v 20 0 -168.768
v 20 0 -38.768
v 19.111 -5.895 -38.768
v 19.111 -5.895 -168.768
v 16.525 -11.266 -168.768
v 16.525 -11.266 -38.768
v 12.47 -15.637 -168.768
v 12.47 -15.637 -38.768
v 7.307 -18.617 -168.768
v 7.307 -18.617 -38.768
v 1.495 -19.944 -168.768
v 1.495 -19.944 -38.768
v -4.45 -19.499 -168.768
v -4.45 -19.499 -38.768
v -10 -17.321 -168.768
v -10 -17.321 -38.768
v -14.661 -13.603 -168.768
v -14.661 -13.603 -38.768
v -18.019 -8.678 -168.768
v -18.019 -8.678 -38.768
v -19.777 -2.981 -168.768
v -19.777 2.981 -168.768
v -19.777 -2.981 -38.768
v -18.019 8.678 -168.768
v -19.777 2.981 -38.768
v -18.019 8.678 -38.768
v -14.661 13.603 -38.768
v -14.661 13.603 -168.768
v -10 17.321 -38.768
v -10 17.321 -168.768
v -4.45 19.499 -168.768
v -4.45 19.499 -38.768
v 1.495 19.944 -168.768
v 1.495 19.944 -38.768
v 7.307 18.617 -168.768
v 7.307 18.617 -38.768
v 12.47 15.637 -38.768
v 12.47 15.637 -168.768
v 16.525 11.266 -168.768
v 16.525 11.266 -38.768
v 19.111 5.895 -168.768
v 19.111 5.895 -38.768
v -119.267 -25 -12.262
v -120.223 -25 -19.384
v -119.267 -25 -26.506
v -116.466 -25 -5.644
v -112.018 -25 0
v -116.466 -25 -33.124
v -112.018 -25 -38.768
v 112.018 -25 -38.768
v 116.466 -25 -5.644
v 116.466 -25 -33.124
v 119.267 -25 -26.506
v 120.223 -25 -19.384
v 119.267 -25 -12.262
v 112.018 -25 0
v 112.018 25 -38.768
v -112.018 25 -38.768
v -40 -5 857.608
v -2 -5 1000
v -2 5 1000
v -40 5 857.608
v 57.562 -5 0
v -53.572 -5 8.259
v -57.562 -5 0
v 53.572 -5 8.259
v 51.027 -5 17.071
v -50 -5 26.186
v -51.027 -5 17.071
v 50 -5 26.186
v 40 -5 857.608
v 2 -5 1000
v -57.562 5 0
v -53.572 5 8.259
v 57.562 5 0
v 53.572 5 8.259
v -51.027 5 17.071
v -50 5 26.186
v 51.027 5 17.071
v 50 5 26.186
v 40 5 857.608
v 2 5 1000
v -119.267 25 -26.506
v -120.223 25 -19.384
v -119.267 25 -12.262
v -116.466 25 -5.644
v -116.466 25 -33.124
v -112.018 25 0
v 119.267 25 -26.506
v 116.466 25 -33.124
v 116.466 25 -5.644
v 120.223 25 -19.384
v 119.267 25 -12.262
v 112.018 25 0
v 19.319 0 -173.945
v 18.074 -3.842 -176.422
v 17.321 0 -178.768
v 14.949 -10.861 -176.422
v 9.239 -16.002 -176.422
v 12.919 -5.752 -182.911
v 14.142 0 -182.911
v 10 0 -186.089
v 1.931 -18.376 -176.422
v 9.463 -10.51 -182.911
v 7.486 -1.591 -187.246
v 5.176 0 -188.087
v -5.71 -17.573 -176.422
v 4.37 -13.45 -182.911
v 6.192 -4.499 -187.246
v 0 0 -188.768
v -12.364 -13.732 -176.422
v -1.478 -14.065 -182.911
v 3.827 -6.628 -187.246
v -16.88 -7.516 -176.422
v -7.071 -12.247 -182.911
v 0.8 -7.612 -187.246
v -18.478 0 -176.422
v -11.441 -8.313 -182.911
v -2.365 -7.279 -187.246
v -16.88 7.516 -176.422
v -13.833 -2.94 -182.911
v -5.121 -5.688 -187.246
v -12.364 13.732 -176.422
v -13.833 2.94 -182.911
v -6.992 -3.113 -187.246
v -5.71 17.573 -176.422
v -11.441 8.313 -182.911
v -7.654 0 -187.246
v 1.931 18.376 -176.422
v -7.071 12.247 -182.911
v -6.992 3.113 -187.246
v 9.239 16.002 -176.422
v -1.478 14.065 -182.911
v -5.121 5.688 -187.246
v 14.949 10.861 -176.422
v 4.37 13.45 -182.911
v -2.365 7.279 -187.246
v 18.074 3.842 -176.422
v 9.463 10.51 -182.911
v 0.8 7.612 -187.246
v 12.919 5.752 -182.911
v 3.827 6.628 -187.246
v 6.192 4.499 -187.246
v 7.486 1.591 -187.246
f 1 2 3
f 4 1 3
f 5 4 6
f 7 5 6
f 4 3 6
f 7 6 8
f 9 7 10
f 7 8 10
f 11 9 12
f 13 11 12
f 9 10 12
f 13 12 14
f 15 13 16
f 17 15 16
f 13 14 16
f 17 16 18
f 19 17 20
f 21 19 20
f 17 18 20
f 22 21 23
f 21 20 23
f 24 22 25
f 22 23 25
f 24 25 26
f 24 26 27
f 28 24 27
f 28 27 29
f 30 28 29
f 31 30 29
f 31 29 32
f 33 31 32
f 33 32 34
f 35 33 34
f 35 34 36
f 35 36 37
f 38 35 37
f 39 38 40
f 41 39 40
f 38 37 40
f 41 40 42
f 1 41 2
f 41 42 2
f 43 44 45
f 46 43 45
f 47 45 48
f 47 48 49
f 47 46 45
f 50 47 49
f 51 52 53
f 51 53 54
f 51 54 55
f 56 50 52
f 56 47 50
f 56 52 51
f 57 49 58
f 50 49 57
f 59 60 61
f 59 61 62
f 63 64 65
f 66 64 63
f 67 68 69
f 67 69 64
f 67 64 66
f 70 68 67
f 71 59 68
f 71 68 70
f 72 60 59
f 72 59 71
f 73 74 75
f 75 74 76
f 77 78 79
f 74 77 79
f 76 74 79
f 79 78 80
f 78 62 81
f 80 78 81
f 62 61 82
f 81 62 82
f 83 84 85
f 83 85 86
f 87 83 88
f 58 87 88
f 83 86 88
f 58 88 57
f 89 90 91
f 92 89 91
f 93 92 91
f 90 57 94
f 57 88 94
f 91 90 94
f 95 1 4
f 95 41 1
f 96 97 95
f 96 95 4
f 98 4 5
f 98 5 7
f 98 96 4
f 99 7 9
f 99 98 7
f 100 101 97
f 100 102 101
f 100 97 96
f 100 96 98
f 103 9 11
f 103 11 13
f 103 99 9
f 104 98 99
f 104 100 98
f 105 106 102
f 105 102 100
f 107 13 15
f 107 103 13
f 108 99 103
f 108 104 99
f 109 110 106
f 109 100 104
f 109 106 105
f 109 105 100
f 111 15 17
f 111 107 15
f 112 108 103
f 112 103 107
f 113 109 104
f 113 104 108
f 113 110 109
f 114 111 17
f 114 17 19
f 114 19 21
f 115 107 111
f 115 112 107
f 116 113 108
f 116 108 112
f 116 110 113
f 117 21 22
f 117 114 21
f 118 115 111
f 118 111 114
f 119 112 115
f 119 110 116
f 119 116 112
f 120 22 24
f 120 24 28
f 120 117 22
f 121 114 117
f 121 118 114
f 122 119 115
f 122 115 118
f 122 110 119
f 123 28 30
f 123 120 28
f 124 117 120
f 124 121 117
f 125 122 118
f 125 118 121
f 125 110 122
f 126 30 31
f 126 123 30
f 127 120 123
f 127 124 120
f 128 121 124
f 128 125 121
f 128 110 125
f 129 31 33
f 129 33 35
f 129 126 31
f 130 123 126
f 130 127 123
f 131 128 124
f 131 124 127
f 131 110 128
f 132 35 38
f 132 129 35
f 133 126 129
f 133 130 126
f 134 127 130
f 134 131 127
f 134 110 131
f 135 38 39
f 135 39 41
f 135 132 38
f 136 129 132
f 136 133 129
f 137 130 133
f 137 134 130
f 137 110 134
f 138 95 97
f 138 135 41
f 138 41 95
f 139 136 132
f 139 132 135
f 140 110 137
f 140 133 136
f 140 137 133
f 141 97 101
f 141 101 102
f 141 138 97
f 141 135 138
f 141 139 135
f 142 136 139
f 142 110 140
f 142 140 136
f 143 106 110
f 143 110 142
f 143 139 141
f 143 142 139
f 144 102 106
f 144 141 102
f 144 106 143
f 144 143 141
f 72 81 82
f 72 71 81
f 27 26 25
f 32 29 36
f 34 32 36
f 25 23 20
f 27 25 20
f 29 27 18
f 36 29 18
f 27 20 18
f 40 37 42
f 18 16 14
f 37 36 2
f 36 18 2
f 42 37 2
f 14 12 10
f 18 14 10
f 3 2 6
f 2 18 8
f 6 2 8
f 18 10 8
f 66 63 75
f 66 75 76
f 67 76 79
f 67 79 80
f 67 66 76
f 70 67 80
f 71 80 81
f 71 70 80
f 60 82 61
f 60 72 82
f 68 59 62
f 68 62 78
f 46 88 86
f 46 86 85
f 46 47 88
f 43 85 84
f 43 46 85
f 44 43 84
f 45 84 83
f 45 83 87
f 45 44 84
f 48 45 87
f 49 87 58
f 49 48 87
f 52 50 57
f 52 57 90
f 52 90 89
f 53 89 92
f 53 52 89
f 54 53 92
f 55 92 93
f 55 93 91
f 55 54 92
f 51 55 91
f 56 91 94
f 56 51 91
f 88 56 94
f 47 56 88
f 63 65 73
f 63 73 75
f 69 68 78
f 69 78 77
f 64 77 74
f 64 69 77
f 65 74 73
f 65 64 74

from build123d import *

# Parameters (mm, degrees)
F1_DEPTH = 5
F2_DEPTH = 25
F3_R     = 20
F4_DEPTH = 150
F5_R     = 20


with BuildPart() as f1:
    # F0 (on Front) → F1 (new body, symmetric)
    with BuildSketch(Plane.XZ):
        with BuildLine():
            Line((2, 1000), (-2, 1000))
            Line((-2, 1000), (-40, 857.608259))
            Line((-40, 857.608259), (-50, 26.185824))
            ThreePointArc((-50, 26.185824), (-52.113169, 12.611339), (-57.561677, 0))
            Line((-57.561677, 0), (0, 0))
            Line((0, 0), (57.561677, 0))
            ThreePointArc((57.561677, 0), (52.113169, 12.611339), (50, 26.185824))
            Line((50, 26.185824), (40, 857.608259))
            Line((40, 857.608259), (2, 1000))
        make_face()
    extrude(amount=F1_DEPTH, both=True)


with BuildPart() as f2:
    # F0 (on Front) → F2 (new body, symmetric)
    with BuildSketch(Plane.XZ):
        with BuildLine():
            Line((0, 0), (-57.561677, 0))
            Line((-57.561677, 0), (-60, 0))
            Line((-60, 0), (-112.018086, 0))
            ThreePointArc((-112.018086, 0), (-120.223236, -19.384213), (-112.018086, -38.768426))
            Line((-112.018086, -38.768426), (0, -38.768426))
            Line((0, -38.768426), (112.018086, -38.768426))
            ThreePointArc((112.018086, -38.768426), (120.223236, -19.384213), (112.018086, 0))
            Line((112.018086, 0), (60, 0))
            Line((60, 0), (57.561677, 0))
            Line((57.561677, 0), (0, 0))
        make_face()
    extrude(amount=F2_DEPTH, both=True)


with BuildPart() as f4:
    # F3 (on face) → F4 (new body)
    with BuildSketch(Plane(origin=(0, 0, -38.768426), x_dir=(1, 0, 0), z_dir=(0, 0, -1))):
        Circle(F3_R)
    extrude(amount=F4_DEPTH)

    # F5
    f5_edges = [f4.edges().sort_by_distance(p)[0] for p in [
        (-20, 0, -188.768426),
    ]]
    fillet(f5_edges, radius=F5_R)


solid = Compound([f1.part, f2.part, f4.part])
